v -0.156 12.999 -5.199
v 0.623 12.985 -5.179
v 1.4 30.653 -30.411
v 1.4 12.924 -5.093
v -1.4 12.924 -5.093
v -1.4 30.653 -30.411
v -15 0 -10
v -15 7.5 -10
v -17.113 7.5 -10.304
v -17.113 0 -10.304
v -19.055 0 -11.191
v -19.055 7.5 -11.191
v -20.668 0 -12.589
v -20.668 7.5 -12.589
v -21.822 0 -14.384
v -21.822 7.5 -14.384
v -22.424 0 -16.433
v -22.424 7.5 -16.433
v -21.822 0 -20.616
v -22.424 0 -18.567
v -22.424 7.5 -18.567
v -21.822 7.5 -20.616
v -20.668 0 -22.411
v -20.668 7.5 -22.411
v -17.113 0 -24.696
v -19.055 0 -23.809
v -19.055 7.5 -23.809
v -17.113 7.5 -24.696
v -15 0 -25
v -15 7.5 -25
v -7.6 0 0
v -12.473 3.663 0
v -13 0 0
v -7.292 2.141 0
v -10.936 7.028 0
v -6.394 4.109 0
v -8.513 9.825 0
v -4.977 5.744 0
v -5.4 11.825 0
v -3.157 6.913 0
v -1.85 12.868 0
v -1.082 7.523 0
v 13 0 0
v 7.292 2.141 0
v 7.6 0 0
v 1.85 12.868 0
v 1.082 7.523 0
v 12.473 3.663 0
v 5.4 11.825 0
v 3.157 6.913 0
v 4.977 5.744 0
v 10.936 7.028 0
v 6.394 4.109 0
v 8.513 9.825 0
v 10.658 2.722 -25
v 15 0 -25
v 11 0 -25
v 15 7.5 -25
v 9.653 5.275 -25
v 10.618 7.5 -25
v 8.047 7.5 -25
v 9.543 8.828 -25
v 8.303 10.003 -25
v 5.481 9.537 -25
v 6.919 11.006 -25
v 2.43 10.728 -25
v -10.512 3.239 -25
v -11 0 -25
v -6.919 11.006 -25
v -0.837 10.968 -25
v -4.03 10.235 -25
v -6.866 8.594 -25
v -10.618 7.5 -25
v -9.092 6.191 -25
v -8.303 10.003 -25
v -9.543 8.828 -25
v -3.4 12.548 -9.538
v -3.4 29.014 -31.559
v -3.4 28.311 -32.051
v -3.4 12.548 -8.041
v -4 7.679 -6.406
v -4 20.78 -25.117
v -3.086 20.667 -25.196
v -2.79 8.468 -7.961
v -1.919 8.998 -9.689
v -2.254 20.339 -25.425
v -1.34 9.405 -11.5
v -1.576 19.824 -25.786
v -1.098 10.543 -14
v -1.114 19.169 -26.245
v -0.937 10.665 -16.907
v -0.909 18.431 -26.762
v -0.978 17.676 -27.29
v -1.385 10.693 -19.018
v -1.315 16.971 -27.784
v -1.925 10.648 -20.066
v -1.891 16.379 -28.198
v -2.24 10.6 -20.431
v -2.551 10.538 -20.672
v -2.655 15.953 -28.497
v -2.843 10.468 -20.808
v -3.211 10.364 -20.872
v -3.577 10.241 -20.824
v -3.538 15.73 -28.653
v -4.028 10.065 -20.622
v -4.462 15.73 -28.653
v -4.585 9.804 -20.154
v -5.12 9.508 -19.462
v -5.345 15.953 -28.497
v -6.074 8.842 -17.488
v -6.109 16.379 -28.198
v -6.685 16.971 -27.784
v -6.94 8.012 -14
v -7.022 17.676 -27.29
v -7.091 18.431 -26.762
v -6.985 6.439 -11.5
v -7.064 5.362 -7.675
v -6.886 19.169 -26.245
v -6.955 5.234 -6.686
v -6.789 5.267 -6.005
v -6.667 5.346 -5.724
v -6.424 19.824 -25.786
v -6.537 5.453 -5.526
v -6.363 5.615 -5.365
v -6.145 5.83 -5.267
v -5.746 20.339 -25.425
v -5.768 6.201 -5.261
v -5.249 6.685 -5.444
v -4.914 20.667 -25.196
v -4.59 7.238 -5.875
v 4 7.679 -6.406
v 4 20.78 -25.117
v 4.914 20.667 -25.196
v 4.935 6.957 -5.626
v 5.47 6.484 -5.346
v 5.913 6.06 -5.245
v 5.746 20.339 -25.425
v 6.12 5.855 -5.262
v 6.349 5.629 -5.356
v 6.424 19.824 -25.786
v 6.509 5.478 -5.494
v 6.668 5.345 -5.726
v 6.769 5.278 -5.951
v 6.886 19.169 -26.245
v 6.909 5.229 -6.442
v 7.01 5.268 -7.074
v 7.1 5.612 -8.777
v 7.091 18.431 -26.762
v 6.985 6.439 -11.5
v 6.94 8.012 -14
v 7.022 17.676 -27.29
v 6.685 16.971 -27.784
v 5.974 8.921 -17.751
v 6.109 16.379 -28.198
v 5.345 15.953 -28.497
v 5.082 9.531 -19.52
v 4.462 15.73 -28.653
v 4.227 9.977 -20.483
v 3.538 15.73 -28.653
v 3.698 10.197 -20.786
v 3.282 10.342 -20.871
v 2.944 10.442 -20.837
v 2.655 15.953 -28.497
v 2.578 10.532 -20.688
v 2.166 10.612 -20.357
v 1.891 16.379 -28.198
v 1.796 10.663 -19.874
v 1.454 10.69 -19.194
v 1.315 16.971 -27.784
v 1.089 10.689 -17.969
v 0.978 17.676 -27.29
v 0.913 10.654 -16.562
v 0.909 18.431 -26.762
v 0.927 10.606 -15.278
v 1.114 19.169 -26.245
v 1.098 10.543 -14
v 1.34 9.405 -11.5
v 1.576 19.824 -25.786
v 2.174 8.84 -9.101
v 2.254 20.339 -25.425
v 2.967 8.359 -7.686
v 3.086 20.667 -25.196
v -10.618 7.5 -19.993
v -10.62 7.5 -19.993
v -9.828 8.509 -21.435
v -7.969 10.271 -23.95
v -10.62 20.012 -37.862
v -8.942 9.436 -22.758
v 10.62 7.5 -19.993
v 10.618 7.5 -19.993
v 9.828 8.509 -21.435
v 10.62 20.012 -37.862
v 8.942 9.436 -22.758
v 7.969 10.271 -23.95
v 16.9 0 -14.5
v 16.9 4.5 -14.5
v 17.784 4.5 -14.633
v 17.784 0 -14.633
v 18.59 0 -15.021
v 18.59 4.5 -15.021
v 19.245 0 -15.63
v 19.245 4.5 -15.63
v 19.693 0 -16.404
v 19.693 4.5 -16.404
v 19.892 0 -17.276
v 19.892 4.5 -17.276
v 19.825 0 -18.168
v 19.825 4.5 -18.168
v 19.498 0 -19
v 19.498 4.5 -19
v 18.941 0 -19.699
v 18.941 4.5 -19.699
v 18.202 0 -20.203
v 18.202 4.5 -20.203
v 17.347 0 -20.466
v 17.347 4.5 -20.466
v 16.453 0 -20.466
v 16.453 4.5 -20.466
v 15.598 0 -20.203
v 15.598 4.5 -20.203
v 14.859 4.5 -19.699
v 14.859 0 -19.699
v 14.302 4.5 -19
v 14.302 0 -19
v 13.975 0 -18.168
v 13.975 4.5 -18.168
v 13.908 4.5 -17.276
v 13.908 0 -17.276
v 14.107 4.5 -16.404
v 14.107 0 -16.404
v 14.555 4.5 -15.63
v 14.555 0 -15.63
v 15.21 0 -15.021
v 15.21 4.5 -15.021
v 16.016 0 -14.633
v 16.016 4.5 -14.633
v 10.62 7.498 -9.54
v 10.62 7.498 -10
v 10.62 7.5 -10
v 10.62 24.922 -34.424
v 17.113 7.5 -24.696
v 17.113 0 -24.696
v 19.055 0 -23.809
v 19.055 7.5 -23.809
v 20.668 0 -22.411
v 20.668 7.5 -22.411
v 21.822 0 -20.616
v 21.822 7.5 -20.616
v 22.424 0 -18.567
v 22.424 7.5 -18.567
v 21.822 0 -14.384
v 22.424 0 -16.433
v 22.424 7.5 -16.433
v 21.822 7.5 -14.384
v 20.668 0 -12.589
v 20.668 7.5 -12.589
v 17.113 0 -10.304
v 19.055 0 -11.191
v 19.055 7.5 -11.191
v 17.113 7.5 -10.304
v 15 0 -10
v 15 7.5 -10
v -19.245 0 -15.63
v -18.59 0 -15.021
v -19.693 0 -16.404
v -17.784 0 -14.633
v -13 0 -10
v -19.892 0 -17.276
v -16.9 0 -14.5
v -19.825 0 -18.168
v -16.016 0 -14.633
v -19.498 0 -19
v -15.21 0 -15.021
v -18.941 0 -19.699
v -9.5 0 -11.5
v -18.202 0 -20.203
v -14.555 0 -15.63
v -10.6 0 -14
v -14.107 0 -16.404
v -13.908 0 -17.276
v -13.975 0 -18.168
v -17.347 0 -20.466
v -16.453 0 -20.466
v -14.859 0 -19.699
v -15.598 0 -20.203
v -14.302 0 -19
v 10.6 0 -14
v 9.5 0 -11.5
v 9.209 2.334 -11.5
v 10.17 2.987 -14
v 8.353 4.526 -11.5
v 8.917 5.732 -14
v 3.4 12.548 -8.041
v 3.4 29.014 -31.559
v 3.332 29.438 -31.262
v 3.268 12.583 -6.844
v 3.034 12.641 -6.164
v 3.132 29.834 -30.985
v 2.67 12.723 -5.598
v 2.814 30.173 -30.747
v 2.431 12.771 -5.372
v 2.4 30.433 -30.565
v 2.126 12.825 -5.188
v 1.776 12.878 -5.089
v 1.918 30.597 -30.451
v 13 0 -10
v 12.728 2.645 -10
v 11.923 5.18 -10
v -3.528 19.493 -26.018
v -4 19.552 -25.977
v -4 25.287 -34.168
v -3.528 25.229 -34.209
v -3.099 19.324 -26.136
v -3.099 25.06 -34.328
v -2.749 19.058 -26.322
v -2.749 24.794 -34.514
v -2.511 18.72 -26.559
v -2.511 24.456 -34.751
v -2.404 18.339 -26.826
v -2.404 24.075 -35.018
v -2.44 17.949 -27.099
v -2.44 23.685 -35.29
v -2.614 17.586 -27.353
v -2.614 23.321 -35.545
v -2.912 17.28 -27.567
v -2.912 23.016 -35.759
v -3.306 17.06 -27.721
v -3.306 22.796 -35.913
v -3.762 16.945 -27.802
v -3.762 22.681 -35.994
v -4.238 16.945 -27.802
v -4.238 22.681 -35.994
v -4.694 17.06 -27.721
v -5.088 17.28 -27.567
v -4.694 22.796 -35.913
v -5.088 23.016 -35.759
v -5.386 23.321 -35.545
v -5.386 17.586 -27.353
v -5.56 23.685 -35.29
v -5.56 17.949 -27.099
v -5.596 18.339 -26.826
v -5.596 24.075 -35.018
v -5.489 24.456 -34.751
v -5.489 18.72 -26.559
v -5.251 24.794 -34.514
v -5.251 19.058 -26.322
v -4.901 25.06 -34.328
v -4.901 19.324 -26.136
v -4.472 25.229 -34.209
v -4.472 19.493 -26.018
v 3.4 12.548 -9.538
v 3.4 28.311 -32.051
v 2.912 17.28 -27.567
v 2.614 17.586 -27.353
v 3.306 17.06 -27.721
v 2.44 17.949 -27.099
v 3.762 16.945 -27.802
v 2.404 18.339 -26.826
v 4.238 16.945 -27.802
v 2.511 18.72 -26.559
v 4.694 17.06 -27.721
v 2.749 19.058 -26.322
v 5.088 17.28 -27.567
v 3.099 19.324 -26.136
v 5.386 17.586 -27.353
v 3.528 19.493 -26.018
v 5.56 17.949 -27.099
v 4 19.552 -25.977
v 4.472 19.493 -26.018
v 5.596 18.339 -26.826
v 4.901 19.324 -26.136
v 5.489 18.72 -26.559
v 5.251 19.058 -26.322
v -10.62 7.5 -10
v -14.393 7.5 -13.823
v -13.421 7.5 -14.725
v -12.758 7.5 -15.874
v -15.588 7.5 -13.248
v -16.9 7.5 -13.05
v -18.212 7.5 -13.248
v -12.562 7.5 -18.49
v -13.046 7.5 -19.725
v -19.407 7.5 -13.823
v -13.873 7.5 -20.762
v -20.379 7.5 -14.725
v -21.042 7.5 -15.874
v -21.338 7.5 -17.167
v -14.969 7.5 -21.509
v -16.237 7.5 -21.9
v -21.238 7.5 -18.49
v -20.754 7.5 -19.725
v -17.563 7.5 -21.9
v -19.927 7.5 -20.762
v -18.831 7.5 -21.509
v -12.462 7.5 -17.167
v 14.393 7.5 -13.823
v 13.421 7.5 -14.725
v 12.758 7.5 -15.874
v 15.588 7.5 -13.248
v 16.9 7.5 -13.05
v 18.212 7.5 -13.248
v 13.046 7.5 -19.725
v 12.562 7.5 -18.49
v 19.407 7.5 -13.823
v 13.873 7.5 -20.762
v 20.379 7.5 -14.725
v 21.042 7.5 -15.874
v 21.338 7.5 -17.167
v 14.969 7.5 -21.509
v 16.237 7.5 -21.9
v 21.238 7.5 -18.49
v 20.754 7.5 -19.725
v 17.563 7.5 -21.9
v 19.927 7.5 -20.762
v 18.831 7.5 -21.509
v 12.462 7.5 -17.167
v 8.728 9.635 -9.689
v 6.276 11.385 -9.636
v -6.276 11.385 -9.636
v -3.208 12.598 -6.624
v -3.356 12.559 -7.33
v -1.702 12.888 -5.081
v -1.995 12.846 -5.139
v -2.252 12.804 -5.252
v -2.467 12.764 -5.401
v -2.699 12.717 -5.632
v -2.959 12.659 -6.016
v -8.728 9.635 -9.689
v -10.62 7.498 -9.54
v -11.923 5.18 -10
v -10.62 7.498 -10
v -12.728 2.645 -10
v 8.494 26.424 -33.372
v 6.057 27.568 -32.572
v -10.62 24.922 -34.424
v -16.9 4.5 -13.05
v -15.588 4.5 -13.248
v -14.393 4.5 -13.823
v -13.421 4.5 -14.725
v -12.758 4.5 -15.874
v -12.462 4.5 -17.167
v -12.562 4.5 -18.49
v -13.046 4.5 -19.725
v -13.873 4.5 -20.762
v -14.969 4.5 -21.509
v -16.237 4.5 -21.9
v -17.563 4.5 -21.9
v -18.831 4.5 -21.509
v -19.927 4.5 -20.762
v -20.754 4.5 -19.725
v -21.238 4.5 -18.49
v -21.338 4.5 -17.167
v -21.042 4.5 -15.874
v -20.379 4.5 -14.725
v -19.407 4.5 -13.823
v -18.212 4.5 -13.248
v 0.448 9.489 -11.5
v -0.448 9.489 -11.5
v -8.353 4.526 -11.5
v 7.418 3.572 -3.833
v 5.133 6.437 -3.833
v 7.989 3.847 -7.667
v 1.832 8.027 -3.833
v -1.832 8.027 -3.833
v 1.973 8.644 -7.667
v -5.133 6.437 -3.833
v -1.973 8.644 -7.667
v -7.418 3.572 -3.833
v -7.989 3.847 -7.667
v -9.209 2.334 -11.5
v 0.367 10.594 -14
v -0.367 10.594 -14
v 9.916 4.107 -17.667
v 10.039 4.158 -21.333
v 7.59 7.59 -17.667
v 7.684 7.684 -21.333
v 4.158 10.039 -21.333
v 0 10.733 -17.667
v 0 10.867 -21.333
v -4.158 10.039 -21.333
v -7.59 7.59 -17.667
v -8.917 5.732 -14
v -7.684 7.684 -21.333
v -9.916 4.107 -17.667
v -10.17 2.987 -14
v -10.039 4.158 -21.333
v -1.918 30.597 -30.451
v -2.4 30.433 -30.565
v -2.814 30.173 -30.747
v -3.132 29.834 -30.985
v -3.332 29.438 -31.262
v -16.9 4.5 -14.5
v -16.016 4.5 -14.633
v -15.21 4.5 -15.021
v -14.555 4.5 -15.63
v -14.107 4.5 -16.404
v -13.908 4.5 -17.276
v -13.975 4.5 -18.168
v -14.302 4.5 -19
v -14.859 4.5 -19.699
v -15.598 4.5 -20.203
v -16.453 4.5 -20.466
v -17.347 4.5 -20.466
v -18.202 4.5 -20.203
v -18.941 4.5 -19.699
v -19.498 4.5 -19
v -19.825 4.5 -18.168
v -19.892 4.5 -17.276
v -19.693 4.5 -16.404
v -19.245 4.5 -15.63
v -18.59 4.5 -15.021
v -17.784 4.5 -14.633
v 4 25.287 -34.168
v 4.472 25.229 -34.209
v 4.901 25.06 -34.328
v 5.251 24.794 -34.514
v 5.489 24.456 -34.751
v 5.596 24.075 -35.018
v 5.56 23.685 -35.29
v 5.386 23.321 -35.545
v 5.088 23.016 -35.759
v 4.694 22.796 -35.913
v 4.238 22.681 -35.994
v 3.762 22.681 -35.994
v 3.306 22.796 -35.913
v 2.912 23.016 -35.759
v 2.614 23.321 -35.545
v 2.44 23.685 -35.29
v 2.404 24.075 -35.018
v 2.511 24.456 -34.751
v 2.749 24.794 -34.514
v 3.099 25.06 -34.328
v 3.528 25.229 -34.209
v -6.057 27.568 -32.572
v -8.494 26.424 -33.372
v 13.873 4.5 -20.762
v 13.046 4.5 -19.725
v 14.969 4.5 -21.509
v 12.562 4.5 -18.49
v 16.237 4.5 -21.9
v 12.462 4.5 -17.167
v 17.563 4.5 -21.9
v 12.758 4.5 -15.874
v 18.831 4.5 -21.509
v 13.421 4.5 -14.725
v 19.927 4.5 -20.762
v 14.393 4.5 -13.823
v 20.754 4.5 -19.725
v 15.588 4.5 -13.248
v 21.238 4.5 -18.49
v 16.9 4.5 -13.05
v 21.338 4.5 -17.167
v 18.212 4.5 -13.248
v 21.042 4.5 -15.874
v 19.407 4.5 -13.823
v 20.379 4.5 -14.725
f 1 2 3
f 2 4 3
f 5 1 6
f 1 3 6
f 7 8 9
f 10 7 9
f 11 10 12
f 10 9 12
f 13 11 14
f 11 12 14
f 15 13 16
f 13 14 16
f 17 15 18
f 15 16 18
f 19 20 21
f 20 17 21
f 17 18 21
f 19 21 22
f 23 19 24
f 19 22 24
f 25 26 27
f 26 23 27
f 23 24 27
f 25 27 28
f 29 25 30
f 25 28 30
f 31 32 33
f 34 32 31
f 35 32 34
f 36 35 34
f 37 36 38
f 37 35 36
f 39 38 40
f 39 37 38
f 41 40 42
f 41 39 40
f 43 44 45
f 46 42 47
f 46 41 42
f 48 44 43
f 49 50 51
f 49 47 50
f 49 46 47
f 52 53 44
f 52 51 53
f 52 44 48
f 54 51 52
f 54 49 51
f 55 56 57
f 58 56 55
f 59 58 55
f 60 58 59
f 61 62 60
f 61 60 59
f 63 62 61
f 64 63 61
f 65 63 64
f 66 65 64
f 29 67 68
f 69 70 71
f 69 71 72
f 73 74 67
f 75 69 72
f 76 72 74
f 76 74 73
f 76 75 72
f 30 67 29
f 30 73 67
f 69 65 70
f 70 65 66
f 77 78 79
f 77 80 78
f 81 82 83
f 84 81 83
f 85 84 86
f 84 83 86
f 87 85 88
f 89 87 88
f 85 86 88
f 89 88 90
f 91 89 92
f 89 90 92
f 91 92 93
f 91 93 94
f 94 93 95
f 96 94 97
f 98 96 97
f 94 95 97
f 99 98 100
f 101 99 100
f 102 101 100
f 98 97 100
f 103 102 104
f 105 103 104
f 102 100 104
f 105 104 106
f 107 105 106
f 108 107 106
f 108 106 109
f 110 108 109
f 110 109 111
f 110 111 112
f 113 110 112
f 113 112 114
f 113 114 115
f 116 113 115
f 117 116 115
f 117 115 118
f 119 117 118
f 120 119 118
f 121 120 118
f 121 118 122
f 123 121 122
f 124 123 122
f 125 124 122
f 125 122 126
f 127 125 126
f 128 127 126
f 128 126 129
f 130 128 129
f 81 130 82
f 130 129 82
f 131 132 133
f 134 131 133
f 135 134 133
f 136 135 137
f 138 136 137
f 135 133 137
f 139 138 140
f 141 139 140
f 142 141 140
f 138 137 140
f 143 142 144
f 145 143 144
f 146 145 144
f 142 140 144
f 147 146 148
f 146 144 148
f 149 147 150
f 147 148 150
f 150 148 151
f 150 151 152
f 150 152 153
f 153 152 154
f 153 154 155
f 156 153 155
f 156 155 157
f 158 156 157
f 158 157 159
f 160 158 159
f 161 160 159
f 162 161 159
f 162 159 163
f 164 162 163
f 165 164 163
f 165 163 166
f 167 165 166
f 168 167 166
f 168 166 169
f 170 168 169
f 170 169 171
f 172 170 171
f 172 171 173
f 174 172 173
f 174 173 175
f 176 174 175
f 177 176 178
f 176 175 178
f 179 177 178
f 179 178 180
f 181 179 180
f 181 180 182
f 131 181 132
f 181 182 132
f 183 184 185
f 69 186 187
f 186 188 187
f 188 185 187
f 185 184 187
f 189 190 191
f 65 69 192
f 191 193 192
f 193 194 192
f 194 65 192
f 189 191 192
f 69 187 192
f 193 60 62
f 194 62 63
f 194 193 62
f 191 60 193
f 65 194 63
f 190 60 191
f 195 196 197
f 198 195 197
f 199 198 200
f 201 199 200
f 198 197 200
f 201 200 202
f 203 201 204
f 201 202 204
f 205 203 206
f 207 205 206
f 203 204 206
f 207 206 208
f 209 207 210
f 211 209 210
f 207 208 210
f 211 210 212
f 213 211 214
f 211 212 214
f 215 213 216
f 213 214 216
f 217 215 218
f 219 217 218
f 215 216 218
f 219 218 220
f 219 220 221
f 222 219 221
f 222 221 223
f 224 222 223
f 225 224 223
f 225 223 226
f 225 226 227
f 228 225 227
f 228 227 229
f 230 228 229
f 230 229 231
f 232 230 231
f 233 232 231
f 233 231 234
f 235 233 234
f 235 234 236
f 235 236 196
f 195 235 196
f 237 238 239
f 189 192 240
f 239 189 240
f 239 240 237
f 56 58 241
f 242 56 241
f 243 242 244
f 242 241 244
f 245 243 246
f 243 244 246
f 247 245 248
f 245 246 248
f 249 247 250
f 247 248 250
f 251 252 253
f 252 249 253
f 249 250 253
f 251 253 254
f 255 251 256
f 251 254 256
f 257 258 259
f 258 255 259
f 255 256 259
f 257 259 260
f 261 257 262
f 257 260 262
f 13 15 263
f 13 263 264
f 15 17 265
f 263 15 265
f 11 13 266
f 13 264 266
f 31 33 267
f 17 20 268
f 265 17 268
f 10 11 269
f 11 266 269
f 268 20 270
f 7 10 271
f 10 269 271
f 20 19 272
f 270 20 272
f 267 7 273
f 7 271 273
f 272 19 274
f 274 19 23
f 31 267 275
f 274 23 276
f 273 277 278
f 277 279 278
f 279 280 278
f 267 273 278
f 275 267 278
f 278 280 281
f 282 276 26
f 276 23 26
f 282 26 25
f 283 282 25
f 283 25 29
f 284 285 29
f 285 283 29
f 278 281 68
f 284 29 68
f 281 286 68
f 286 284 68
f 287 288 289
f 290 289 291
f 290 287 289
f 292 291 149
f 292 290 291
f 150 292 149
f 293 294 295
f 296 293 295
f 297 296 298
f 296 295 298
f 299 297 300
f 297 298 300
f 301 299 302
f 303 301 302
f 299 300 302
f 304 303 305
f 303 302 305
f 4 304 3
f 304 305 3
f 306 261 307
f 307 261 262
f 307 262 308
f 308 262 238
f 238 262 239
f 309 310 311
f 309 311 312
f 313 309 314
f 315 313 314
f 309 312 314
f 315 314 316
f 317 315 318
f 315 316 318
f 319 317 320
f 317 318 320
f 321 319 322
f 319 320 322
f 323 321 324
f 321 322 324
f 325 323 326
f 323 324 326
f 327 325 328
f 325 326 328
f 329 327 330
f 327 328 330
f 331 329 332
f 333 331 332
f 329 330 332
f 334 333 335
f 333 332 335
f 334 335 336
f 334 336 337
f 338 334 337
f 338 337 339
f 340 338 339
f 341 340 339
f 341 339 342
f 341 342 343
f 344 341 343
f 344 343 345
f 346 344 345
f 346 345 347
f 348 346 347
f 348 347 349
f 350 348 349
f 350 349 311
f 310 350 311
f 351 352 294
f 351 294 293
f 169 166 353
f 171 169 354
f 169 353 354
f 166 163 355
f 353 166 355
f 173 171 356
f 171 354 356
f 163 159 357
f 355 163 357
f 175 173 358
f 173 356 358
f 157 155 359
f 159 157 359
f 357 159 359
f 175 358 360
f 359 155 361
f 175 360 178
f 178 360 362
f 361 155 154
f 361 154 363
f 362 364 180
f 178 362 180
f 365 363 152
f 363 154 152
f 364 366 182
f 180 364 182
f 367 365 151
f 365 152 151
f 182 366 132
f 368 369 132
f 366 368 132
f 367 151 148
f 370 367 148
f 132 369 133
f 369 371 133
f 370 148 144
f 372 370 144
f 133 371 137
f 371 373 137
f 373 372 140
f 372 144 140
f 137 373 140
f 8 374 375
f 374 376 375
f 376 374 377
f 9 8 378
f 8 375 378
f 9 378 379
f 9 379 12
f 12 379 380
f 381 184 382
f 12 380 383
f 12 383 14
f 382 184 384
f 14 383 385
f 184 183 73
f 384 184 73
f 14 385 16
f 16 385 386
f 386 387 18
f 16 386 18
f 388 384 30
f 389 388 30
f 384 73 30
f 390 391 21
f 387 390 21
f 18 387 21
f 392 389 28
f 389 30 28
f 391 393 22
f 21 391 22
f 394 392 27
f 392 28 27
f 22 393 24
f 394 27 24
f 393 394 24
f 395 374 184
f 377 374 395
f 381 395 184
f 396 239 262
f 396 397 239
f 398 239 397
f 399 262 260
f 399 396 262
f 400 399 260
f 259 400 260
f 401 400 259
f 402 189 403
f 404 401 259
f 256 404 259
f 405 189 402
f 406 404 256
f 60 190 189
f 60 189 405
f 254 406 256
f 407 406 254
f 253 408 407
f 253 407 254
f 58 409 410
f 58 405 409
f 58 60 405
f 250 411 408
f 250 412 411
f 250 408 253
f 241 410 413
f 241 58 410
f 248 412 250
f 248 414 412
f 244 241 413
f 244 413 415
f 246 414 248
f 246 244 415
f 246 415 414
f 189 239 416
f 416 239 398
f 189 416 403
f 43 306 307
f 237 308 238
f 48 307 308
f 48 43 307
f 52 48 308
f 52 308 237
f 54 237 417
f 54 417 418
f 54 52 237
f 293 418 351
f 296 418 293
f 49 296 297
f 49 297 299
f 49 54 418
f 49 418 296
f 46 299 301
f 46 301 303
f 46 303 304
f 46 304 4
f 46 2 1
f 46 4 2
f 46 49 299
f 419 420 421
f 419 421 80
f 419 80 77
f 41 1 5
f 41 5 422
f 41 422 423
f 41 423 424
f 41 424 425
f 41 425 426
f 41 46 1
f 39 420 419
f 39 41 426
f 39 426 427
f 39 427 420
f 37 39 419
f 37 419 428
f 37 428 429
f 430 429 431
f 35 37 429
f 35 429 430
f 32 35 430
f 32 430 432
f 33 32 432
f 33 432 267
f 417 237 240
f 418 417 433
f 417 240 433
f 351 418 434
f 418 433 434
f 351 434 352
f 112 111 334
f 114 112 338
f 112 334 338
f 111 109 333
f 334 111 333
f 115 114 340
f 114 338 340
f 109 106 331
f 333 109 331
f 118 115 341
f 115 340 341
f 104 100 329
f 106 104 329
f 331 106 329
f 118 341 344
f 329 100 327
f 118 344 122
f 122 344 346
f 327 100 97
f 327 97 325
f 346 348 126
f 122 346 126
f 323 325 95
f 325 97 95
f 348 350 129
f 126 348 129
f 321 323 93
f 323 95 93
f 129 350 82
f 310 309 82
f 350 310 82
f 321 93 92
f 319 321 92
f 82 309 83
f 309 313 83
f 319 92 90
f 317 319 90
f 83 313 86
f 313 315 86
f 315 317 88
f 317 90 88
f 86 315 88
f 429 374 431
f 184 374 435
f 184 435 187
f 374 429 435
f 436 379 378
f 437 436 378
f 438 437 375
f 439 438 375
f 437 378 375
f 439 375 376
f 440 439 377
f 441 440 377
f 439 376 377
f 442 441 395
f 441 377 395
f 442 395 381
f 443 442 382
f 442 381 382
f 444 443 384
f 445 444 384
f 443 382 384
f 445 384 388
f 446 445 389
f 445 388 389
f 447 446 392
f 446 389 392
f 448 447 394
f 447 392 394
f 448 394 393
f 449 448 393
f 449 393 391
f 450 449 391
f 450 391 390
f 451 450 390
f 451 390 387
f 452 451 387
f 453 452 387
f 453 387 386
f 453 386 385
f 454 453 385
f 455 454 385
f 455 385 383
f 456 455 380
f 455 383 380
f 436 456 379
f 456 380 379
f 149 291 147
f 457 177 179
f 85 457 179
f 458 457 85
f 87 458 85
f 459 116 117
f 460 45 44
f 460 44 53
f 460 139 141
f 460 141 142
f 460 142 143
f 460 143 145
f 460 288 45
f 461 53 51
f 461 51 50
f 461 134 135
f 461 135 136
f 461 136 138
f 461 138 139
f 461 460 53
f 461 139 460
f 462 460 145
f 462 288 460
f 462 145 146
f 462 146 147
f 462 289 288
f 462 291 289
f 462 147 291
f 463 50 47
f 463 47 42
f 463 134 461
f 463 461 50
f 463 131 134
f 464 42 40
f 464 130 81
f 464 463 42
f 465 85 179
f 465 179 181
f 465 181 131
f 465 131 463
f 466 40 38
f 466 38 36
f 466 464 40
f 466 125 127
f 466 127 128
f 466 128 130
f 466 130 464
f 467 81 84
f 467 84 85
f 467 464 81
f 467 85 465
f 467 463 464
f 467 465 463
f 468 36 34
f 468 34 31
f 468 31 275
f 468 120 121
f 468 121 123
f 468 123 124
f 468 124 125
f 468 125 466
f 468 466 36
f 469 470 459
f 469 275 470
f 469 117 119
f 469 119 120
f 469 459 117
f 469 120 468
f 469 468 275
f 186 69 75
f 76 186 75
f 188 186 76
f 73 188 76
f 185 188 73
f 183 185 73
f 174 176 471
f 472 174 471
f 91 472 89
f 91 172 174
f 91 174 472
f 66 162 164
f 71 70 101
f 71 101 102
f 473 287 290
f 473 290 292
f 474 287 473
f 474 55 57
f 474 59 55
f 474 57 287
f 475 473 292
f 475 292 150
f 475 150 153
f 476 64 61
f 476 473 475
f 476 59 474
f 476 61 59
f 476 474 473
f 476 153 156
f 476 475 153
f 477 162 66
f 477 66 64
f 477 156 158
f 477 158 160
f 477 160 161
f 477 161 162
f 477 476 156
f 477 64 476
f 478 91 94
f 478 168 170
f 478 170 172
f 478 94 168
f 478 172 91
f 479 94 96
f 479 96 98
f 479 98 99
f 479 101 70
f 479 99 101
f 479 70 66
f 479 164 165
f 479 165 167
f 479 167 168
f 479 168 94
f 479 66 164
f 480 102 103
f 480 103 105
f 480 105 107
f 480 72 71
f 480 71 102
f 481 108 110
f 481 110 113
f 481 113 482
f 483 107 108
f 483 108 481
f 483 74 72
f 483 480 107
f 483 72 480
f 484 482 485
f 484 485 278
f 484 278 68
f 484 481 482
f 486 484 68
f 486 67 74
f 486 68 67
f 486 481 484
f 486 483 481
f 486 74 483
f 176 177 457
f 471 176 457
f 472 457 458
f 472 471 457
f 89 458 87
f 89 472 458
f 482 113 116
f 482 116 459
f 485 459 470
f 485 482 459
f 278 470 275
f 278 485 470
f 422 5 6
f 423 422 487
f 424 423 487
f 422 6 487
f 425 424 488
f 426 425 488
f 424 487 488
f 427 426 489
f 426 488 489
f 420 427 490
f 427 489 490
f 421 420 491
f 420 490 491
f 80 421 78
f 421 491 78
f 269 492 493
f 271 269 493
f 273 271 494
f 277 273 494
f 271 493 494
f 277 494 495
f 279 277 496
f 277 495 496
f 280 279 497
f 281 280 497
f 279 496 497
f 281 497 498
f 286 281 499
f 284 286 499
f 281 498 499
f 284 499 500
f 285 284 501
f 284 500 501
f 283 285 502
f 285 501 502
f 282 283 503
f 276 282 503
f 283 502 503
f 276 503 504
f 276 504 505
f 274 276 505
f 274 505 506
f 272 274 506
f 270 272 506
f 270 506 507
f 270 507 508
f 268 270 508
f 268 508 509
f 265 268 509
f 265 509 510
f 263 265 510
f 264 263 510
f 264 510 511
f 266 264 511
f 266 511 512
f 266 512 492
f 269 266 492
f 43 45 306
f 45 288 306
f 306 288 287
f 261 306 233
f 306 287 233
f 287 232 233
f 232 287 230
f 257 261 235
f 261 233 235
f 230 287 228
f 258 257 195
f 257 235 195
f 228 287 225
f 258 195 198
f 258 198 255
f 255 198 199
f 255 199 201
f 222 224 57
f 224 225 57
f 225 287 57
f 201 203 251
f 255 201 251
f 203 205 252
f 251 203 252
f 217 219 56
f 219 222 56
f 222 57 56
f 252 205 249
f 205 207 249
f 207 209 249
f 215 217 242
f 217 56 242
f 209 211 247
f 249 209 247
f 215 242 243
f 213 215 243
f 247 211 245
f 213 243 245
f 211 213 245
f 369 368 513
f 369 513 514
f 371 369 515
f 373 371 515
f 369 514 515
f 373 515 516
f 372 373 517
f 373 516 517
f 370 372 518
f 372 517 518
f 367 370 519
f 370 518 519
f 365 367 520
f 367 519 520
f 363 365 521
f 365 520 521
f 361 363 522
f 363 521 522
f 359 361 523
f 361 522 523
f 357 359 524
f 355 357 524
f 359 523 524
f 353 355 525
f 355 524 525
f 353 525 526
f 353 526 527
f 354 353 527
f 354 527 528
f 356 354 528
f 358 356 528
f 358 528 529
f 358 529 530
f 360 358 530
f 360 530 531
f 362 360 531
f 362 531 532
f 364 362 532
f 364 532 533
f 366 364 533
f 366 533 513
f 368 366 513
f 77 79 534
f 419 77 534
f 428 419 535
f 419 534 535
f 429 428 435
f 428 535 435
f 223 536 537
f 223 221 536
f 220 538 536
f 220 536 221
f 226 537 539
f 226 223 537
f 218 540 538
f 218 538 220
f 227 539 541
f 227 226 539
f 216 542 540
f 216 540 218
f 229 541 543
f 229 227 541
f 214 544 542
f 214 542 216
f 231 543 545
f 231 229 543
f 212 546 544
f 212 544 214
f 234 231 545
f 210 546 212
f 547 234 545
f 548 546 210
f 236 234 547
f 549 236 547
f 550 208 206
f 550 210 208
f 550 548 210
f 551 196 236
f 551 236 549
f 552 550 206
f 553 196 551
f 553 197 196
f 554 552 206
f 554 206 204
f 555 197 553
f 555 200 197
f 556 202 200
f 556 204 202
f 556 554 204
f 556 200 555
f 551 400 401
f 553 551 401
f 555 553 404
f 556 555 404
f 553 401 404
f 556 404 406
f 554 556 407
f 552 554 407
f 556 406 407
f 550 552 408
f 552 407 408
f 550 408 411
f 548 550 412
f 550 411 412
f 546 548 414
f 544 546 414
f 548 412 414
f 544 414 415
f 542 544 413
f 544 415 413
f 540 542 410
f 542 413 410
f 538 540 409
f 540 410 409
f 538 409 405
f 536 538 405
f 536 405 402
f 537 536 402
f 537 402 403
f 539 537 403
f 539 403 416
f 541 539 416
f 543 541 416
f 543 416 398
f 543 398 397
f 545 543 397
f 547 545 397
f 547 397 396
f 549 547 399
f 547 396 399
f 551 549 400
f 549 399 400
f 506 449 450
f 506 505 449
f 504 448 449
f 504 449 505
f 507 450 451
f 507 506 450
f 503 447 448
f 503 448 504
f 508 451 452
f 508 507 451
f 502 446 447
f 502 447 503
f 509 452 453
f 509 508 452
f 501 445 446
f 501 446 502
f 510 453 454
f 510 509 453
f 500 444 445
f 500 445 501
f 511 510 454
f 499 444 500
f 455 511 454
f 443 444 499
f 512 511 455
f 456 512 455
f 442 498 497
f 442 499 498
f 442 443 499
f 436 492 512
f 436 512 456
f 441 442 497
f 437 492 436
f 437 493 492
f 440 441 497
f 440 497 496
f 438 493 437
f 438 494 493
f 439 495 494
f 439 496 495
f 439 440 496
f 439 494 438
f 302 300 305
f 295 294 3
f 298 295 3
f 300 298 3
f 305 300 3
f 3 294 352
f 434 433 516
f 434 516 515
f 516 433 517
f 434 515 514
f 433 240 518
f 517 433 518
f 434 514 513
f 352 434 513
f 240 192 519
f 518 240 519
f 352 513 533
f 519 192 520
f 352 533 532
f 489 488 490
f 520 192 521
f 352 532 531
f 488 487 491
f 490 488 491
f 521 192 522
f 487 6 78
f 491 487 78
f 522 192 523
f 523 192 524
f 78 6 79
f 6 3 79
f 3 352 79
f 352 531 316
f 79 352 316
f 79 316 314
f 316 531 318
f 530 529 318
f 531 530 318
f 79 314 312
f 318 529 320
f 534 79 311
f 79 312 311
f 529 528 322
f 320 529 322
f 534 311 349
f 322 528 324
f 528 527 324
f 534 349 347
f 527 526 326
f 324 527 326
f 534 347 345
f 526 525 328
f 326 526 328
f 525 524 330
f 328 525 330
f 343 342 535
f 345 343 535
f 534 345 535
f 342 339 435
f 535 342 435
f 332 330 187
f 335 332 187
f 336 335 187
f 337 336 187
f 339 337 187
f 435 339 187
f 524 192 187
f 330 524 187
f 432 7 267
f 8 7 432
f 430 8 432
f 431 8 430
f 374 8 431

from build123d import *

# Parameters (mm, degrees)
SKETCH1_R             = 13
BOSS_EXTRUDE1_DEPTH   = 25
BOSS_EXTRUDE2_DEPTH   = 7.5
BOSS_EXTRUDE2_2_DEPTH = 7.5
BOSS_EXTRUDE3_DEPTH   = 15
SKETCH5_R             = 3
CUT_EXTRUDE1_DEPTH    = 40.389084782
SKETCH6_R             = 4.45
CUT_EXTRUDE2_DEPTH    = 3
SKETCH7_R             = 4
CUT_EXTRUDE3_DEPTH    = 7.5
BOSS_EXTRUDE6_REACH   = 57.809
SKETCH10_R            = 1.6
CUT_EXTRUDE4_DEPTH    = 56.808932723
SKETCH11_R            = 3.1
CUT_EXTRUDE5_DEPTH    = 48.070587643
SKETCH12_W            = 50
SKETCH12_H            = 50
CUT_EXTRUDE8_DEPTH    = 54.659969844


with BuildPart() as part:
    # Sketch1 → Boss-Extrude1 (new body)
    with BuildSketch(Plane.XY):
        Circle(SKETCH1_R)
    extrude(amount=-BOSS_EXTRUDE1_DEPTH)

    # Sketch2 → Cut-Revolve1 (revolve, cut)
    with BuildSketch(Plane(origin=(0, 0, 0), x_dir=(0, 0, -1), z_dir=(1, 0, 0))):
        Polygon((0, 0), (0, 7.6), (11.5, 9.5), (14, 10.6), (25, 11), (25, 0), align=None)
    revolve(axis=Axis((0, 0, -25), (0, 0, 1)), mode=Mode.SUBTRACT)



with BuildPart() as body_2:
    # Sketch3 → Boss-Extrude2 (new, symmetric)
    with BuildSketch(Plane(origin=(0, 0, 0), x_dir=(1, 0, 0), z_dir=(0, 1, 0))):
        with BuildLine():
            Line((-13, 25), (-13, 10))
            Line((-13, 10), (-15, 10))
            ThreePointArc((-15, 10), (-22.5, 17.5), (-15, 25))
            Line((-15, 25), (-13, 25))
        make_face()
    extrude(amount=BOSS_EXTRUDE2_DEPTH, both=True)


with BuildPart() as body_3:
    # Sketch3 → Boss-Extrude2 2 (new, symmetric)
    with BuildSketch(Plane(origin=(0, 0, 0), x_dir=(1, 0, 0), z_dir=(0, 1, 0))):
        with BuildLine():
            Line((13, 25), (15, 25))
            ThreePointArc((15, 25), (22.5, 17.5), (15, 10))
            Line((15, 10), (13, 10))
            Line((13, 10), (13, 25))
        make_face()
    extrude(amount=BOSS_EXTRUDE2_2_DEPTH, both=True)


with BuildPart() as part_1:
    add(part.part)

    add(body_2.part)  # Boss-Extrude3 merges body 2

    add(body_3.part)  # Boss-Extrude3 merges body 3
    # Sketch4 → Boss-Extrude3 (add)
    with BuildSketch(Plane(origin=(0, 0, -25), x_dir=(-1, 0, 0), z_dir=(0, 0, -1))):
        with BuildLine():
            Line((-13, 7.5), (-13, -7.5))
            Line((-13, -7.5), (-8.04673847, -7.5))
            ThreePointArc((-8.04673847, -7.5), (-11, 0), (-8.04673847, 7.5))
            Line((-8.04673847, 7.5), (-13, 7.5))
        make_face()
        with BuildLine():
            Line((13, 7.5), (13, -7.5))
            Line((13, -7.5), (8.04673847, -7.5))
            ThreePointArc((8.04673847, -7.5), (11, 0), (8.04673847, 7.5))
            Line((8.04673847, 7.5), (13, 7.5))
        make_face()
    extrude(amount=-BOSS_EXTRUDE3_DEPTH)

    # Sketch5 → Cut-Extrude1 (cut, through all)
    with BuildSketch(Plane(origin=(0, 7.5, 0), x_dir=(1, 0, 0), z_dir=(0, 1, 0))):
        with Locations((16.9, 17.5)):
            Circle(SKETCH5_R)
        with Locations((-16.9, 17.5)):
            Circle(SKETCH5_R)
    extrude(amount=-CUT_EXTRUDE1_DEPTH, mode=Mode.SUBTRACT)

    # Sketch6 → Cut-Extrude2 (cut)
    with BuildSketch(Plane(origin=(0, 7.5, 0), x_dir=(1, 0, 0), z_dir=(0, 1, 0))):
        with Locations((-16.9, 17.5)):
            Circle(SKETCH6_R)
        with Locations((16.9, 17.5)):
            Circle(SKETCH6_R)
    extrude(amount=-CUT_EXTRUDE2_DEPTH, mode=Mode.SUBTRACT)

    # Sketch7 → Cut-Extrude3 (cut)
    with BuildSketch(Plane.XZ.offset(7.5)):
        with Locations((-16.9, -17.5)):
            Circle(SKETCH7_R)
        with Locations((16.9, -17.5)):
            Circle(SKETCH7_R)
    extrude(amount=-CUT_EXTRUDE3_DEPTH, mode=Mode.SUBTRACT)

    # Sketch9 → Boss-Extrude6 (add, up to next)
    with BuildSketch(Plane(origin=(0, 24.373180657, -34.808509373), x_dir=(1, 0, 0), z_dir=(0, 0.5735764363510444, -0.819152044288993)), mode=Mode.PRIVATE) as boss_extrude6_sk1:
        with BuildLine():
            Line((-10.62, 5.324042616), (10.62, 5.324042616))
            Line((10.62, 5.324042616), (10.62, -0.669893629))
            ThreePointArc((10.62, -0.669893629), (7.308881484, -3.260182231), (3.4, -4.807355917))
            Line((3.4, -4.807355917), (3.4, -5.665957384))
            ThreePointArc((3.4, -5.665957384), (2.814213562, -7.080170946), (1.4, -7.665957384))
            Line((1.4, -7.665957384), (-1.4, -7.665957384))
            ThreePointArc((-1.4, -7.665957384), (-2.814213562, -7.080170946), (-3.4, -5.665957384))
            Line((-3.4, -5.665957384), (-3.4, -4.807355917))
            ThreePointArc((-3.4, -4.807355917), (-7.308881484, -3.260182231), (-10.62, -0.669893629))
            Line((-10.62, -0.669893629), (-10.62, 5.324042616))
        make_face()
    boss_extrude6_tool1 = extrude(boss_extrude6_sk1.sketch, amount=-BOSS_EXTRUDE6_REACH, mode=Mode.PRIVATE) - part_1.part
    add(boss_extrude6_tool1.solids().sort_by_distance((0, 24.258264, -34.888975))[0])

    # Sketch10 → Cut-Extrude4 (cut, through all)
    with BuildSketch(Plane(origin=(0, 24.373180657, -34.808509373), x_dir=(-1, 0, 0), z_dir=(0, 0.5735764363510444, -0.819152044288993))):
        with Locations((-4, -0.484042616)):
            Circle(SKETCH10_R)
        with Locations((4, -0.484042616)):
            Circle(SKETCH10_R)
    extrude(amount=-CUT_EXTRUDE4_DEPTH, mode=Mode.SUBTRACT)

    # Sketch11 → Cut-Extrude5 (cut, through all)
    with BuildSketch(Plane(origin=(0, 18.637416293, -26.61698893), x_dir=(1, 0, 0), z_dir=(0, 0.5735764363510444, -0.819152044288993))):
        with Locations((4, 0.484042616)):
            Circle(SKETCH11_R)
        with Locations((-4, 0.484042616)):
            Circle(SKETCH11_R)
    extrude(amount=-CUT_EXTRUDE5_DEPTH, mode=Mode.SUBTRACT)

    # Sketch12 → Cut-Extrude8 (cut, through all)
    with BuildSketch(Plane(origin=(0, 0, 0), x_dir=(1, 0, 0), z_dir=(0, 1, 0))):
        with Locations((0, 14.017641389)):
            Rectangle(SKETCH12_W, SKETCH12_H)
    extrude(amount=-CUT_EXTRUDE8_DEPTH, mode=Mode.SUBTRACT)


solid = part_1.part
